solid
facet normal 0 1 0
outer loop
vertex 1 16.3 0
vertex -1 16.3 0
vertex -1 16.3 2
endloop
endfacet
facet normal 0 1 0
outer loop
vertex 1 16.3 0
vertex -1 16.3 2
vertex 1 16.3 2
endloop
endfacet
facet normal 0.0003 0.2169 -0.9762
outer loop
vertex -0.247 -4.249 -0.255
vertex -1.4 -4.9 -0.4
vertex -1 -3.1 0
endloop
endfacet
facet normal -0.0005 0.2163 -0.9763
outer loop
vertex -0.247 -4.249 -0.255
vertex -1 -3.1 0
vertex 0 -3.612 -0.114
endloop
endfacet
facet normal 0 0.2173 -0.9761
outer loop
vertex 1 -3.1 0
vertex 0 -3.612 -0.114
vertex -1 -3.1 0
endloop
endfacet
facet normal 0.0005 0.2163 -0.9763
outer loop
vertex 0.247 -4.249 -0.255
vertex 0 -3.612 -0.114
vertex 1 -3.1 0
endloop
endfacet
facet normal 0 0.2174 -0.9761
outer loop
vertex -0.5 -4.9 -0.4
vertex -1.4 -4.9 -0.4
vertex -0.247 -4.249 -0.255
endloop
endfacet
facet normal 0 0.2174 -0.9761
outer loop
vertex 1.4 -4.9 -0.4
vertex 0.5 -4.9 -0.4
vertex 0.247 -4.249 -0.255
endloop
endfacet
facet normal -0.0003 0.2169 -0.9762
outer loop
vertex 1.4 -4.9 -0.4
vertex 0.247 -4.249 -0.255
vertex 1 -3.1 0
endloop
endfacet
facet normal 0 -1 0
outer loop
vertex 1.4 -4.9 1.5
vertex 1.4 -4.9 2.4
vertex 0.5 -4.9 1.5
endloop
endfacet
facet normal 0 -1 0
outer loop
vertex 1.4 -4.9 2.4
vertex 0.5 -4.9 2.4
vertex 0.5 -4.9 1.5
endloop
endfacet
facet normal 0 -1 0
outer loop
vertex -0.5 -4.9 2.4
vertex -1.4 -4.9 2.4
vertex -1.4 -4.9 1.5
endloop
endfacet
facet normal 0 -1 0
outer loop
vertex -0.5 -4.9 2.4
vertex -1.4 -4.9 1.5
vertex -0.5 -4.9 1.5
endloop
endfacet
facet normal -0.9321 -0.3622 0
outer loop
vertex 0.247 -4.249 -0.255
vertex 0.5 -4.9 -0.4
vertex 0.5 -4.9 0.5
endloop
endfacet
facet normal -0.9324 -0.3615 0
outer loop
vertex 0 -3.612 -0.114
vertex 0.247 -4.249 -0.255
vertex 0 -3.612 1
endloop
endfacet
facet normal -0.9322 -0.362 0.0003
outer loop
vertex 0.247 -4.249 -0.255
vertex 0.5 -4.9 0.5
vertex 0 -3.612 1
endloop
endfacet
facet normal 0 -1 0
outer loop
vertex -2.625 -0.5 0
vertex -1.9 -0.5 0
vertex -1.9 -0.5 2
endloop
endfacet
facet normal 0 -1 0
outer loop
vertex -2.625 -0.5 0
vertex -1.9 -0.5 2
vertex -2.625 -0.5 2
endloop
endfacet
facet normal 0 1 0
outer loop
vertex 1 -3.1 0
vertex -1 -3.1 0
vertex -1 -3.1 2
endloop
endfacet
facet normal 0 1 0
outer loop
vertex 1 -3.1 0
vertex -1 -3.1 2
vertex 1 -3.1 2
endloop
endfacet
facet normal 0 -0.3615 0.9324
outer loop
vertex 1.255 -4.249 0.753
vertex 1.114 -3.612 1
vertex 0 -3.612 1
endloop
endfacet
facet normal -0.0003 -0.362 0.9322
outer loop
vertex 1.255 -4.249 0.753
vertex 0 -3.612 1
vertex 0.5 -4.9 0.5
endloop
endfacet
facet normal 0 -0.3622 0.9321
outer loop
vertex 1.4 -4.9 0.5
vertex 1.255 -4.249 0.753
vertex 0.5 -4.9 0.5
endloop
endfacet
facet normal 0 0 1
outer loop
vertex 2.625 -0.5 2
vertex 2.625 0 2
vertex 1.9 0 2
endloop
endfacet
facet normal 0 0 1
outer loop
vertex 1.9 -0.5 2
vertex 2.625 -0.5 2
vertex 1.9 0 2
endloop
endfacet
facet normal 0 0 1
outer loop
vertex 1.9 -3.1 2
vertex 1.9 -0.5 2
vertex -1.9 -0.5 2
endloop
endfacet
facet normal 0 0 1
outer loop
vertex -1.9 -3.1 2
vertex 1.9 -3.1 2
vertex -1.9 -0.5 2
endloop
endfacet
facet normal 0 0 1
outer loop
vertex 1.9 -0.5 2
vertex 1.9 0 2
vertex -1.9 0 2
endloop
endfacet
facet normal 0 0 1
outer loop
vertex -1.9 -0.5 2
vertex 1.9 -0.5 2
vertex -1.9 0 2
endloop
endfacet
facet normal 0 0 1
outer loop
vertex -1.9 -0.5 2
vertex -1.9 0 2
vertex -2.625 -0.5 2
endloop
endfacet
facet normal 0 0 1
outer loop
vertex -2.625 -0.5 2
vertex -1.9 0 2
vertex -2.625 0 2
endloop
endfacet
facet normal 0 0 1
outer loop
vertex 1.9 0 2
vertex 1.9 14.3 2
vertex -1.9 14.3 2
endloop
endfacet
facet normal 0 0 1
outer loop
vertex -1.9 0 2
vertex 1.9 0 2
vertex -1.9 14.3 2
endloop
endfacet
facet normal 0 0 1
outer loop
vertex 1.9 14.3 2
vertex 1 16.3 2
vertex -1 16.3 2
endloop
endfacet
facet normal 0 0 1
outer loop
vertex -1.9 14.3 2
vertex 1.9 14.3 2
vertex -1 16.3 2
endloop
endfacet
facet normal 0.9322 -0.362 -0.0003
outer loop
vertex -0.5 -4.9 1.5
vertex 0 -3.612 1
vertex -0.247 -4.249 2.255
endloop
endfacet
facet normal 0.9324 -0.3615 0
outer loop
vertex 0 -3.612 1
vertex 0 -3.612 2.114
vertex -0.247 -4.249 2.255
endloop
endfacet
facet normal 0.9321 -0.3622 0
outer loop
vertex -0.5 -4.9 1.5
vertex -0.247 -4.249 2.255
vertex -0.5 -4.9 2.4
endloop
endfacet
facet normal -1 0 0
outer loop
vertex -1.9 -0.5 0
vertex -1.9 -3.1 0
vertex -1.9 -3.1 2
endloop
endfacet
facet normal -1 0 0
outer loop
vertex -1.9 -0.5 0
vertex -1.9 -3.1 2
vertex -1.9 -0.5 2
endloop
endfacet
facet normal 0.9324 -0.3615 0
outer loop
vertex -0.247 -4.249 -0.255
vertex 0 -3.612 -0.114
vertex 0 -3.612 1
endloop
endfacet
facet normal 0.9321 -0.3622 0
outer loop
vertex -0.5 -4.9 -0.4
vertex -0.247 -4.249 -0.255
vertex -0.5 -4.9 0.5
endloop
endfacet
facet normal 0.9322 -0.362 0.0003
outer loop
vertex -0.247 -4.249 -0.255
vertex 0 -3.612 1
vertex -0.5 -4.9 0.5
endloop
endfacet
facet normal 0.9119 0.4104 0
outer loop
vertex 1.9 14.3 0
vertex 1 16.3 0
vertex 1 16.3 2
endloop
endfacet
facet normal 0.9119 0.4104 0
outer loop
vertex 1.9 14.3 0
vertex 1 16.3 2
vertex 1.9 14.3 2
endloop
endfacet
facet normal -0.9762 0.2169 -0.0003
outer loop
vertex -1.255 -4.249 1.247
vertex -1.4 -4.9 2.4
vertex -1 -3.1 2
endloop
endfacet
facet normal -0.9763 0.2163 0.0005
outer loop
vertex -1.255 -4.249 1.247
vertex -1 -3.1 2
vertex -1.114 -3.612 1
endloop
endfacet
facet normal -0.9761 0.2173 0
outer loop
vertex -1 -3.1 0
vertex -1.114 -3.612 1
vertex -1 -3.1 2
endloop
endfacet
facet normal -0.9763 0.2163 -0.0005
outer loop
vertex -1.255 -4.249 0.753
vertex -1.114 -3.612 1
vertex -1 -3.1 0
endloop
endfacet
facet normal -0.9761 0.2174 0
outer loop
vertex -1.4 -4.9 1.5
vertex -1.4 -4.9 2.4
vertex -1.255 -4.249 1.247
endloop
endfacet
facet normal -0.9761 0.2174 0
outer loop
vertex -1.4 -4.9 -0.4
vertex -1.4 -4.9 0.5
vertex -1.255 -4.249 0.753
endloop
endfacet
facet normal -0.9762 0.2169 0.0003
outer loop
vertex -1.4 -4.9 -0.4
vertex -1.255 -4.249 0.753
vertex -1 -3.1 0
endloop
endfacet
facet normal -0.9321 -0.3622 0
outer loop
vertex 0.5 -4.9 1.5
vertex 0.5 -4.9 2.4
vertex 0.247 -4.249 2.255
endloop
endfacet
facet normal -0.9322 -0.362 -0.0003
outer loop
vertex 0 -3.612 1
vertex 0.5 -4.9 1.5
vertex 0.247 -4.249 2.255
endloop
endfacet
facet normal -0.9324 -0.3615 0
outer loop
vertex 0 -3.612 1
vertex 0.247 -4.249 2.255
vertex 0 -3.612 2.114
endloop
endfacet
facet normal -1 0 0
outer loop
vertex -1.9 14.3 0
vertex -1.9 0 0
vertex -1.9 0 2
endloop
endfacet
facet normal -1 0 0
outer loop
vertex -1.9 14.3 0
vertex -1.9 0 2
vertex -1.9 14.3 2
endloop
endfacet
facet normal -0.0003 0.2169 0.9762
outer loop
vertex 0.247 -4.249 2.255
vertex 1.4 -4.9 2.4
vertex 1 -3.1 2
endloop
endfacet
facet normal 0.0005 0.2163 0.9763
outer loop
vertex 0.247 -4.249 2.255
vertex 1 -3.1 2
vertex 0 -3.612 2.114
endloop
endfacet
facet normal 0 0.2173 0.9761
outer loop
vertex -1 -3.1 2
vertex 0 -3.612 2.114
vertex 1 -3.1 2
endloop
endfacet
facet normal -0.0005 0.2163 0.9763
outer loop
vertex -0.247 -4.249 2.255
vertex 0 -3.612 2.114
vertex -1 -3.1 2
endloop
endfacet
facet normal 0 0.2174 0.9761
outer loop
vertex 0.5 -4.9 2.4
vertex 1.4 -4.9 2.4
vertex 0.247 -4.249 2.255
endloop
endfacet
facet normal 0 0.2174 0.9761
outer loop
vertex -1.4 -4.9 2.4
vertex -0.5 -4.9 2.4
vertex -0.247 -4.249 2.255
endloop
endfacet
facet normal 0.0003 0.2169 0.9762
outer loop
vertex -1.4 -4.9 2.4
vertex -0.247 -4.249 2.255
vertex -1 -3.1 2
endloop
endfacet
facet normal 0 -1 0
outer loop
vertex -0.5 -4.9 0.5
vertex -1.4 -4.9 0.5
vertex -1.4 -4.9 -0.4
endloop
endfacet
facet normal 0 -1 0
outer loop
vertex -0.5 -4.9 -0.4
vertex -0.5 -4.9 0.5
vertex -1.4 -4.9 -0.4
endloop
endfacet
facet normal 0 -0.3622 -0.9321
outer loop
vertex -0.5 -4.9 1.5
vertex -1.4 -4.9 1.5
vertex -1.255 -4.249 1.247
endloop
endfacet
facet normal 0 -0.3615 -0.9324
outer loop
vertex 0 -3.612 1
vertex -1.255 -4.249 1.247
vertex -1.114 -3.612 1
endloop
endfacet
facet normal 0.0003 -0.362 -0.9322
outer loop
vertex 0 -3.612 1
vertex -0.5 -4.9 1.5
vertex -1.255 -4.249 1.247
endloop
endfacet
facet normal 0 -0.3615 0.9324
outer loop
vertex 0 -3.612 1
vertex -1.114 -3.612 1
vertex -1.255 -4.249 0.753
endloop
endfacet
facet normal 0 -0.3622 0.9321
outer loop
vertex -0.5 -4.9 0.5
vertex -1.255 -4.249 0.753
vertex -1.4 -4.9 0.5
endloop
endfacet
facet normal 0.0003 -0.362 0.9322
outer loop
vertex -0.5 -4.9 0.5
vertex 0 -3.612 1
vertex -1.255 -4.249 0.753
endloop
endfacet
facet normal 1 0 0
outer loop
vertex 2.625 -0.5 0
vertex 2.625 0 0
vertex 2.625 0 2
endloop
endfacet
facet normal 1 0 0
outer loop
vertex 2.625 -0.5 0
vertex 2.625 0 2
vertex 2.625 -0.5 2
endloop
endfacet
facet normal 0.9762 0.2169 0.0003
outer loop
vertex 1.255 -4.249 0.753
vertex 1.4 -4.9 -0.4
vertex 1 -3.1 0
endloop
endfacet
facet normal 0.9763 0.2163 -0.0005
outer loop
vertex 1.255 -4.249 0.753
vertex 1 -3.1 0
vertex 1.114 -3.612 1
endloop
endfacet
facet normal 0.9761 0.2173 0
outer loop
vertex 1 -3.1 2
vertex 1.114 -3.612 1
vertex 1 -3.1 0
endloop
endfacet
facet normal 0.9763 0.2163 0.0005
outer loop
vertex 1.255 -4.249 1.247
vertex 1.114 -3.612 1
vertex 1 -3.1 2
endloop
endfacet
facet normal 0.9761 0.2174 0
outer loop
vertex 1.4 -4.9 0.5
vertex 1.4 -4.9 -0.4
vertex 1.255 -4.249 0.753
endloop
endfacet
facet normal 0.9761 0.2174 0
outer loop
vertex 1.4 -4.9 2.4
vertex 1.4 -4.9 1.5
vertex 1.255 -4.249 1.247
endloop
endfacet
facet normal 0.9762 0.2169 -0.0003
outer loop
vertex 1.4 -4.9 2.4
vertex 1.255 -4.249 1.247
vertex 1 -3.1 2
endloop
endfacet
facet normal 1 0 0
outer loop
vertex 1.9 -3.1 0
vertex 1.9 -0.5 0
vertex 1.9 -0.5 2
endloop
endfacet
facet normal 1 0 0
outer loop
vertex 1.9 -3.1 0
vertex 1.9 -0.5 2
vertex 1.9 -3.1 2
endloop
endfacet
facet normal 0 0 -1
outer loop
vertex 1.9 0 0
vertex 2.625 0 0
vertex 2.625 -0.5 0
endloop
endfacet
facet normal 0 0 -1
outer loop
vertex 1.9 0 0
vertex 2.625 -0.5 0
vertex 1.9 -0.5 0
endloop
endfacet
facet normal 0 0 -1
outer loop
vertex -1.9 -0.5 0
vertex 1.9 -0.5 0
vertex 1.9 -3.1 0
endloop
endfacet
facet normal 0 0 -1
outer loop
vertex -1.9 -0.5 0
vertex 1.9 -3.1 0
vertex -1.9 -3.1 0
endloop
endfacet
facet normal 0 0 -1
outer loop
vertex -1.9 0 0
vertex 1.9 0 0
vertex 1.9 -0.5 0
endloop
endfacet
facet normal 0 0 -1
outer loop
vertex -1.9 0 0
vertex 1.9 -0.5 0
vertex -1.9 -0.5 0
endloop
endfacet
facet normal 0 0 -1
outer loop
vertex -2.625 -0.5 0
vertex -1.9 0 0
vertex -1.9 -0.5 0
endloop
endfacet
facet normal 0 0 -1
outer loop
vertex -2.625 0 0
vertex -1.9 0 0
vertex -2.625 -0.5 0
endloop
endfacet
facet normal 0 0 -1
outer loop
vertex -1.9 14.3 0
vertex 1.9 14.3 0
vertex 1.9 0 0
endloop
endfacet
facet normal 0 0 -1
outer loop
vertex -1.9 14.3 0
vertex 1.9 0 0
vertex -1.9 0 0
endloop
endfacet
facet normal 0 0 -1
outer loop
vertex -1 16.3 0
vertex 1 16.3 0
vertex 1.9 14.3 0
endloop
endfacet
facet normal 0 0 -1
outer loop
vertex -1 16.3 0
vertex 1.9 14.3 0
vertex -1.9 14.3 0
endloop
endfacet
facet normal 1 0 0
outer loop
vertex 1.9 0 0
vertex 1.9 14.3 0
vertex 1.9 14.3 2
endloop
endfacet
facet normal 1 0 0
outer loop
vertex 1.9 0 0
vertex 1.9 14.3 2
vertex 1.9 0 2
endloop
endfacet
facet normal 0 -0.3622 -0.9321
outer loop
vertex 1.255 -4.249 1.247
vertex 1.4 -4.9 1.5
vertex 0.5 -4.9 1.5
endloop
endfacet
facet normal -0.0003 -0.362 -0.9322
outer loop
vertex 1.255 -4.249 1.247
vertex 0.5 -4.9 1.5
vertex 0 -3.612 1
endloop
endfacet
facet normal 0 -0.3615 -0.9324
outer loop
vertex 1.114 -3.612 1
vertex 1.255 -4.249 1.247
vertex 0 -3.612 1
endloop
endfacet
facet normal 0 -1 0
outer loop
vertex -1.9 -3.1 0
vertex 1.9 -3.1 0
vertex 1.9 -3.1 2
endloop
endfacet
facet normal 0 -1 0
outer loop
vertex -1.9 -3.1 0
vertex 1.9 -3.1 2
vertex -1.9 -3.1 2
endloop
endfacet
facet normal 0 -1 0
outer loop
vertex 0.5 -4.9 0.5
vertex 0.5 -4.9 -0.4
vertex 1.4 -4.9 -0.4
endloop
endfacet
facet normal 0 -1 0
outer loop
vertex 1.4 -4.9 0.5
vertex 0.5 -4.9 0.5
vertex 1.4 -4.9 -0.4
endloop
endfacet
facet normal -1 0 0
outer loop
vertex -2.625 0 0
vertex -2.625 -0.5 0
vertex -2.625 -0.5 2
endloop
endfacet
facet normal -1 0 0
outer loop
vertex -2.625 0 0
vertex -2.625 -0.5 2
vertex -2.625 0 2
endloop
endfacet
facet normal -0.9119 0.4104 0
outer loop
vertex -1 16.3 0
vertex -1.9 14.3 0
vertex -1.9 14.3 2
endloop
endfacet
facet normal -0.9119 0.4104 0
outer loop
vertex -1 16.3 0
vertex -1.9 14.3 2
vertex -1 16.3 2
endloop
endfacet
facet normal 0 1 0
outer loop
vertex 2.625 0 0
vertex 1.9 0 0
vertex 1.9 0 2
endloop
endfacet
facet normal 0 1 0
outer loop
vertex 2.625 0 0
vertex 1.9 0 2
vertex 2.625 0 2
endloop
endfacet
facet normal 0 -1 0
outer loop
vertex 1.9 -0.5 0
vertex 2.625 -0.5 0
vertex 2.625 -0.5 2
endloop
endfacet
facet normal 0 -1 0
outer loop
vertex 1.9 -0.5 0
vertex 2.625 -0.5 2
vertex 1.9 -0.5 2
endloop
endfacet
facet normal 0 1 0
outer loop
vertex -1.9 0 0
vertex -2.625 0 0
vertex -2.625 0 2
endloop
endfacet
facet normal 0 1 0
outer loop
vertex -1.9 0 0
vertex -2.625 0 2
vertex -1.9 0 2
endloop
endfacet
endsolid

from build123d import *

# Parameters (mm, degrees)
BOSS_EXTRUDE1_DEPTH     = 2
SKETCH2_W               = 2
SKETCH2_H               = 2
SKETCH3_W               = 2.8
SKETCH3_H               = 2.8
CUT_EXTRUDE1_DEPTH      = 1.6000001
CUT_EXTRUDE1_DEPTH_BACK = 3.2000001
CUT_EXTRUDE2_DEPTH      = 5.425
CUT_EXTRUDE2_DEPTH_BACK = 1.825


with BuildPart() as part:
    # Sketch1 → Boss-Extrude1 (new body)
    with BuildSketch(Plane.XY):
        Polygon((1.9, 0), (2.625, 0), (2.625, -0.5), (1.9, -0.5), (1.9, -3.1), (-1.9, -3.1), (-1.9, -0.5), (-2.625, -0.5), (-2.625, 0), (-1.9, 0), (-1.9, 14.3), (-1, 16.3), (1, 16.3), (1.9, 14.3), align=None)
    extrude(amount=BOSS_EXTRUDE1_DEPTH)


with BuildPart() as body_2:
    # Sketch2 → Loft1 section 0
    with BuildSketch(Plane.XZ.offset(3.1)):
        with Locations((0, 1)):
            Rectangle(SKETCH2_W, SKETCH2_H)
    # Sketch3 → Loft1 section 1
    with BuildSketch(Plane(origin=(0, -4.9, 0), x_dir=(-1, 0, 0), z_dir=(0, -1, 0))):
        with Locations((0, -1)):
            Rectangle(SKETCH3_W, SKETCH3_H)
    loft()

    # Sketch4 → Cut-Extrude1 (cut, two sides)
    with BuildSketch(Plane.XY.offset(1.8)) as cut_extrude1_sk:
        Polygon((0, -3.611513086), (-0.5, -4.9), (0.5, -4.9), align=None)
    extrude(amount=CUT_EXTRUDE1_DEPTH, mode=Mode.SUBTRACT)
    extrude(cut_extrude1_sk.sketch, amount=-CUT_EXTRUDE1_DEPTH_BACK, mode=Mode.SUBTRACT)

    # Sketch5 → Cut-Extrude2 (cut, two sides)
    with BuildSketch(Plane(origin=(1.8, 0, -1.8), x_dir=(0, 0, 1), z_dir=(-1, 0, 0))) as cut_extrude2_sk:
        Polygon((2.8, -3.611513086), (2.3, -4.9), (3.3, -4.9), align=None)
    extrude(amount=CUT_EXTRUDE2_DEPTH, mode=Mode.SUBTRACT)
    extrude(cut_extrude2_sk.sketch, amount=-CUT_EXTRUDE2_DEPTH_BACK, mode=Mode.SUBTRACT)


solid = Compound([part.part, body_2.part])
